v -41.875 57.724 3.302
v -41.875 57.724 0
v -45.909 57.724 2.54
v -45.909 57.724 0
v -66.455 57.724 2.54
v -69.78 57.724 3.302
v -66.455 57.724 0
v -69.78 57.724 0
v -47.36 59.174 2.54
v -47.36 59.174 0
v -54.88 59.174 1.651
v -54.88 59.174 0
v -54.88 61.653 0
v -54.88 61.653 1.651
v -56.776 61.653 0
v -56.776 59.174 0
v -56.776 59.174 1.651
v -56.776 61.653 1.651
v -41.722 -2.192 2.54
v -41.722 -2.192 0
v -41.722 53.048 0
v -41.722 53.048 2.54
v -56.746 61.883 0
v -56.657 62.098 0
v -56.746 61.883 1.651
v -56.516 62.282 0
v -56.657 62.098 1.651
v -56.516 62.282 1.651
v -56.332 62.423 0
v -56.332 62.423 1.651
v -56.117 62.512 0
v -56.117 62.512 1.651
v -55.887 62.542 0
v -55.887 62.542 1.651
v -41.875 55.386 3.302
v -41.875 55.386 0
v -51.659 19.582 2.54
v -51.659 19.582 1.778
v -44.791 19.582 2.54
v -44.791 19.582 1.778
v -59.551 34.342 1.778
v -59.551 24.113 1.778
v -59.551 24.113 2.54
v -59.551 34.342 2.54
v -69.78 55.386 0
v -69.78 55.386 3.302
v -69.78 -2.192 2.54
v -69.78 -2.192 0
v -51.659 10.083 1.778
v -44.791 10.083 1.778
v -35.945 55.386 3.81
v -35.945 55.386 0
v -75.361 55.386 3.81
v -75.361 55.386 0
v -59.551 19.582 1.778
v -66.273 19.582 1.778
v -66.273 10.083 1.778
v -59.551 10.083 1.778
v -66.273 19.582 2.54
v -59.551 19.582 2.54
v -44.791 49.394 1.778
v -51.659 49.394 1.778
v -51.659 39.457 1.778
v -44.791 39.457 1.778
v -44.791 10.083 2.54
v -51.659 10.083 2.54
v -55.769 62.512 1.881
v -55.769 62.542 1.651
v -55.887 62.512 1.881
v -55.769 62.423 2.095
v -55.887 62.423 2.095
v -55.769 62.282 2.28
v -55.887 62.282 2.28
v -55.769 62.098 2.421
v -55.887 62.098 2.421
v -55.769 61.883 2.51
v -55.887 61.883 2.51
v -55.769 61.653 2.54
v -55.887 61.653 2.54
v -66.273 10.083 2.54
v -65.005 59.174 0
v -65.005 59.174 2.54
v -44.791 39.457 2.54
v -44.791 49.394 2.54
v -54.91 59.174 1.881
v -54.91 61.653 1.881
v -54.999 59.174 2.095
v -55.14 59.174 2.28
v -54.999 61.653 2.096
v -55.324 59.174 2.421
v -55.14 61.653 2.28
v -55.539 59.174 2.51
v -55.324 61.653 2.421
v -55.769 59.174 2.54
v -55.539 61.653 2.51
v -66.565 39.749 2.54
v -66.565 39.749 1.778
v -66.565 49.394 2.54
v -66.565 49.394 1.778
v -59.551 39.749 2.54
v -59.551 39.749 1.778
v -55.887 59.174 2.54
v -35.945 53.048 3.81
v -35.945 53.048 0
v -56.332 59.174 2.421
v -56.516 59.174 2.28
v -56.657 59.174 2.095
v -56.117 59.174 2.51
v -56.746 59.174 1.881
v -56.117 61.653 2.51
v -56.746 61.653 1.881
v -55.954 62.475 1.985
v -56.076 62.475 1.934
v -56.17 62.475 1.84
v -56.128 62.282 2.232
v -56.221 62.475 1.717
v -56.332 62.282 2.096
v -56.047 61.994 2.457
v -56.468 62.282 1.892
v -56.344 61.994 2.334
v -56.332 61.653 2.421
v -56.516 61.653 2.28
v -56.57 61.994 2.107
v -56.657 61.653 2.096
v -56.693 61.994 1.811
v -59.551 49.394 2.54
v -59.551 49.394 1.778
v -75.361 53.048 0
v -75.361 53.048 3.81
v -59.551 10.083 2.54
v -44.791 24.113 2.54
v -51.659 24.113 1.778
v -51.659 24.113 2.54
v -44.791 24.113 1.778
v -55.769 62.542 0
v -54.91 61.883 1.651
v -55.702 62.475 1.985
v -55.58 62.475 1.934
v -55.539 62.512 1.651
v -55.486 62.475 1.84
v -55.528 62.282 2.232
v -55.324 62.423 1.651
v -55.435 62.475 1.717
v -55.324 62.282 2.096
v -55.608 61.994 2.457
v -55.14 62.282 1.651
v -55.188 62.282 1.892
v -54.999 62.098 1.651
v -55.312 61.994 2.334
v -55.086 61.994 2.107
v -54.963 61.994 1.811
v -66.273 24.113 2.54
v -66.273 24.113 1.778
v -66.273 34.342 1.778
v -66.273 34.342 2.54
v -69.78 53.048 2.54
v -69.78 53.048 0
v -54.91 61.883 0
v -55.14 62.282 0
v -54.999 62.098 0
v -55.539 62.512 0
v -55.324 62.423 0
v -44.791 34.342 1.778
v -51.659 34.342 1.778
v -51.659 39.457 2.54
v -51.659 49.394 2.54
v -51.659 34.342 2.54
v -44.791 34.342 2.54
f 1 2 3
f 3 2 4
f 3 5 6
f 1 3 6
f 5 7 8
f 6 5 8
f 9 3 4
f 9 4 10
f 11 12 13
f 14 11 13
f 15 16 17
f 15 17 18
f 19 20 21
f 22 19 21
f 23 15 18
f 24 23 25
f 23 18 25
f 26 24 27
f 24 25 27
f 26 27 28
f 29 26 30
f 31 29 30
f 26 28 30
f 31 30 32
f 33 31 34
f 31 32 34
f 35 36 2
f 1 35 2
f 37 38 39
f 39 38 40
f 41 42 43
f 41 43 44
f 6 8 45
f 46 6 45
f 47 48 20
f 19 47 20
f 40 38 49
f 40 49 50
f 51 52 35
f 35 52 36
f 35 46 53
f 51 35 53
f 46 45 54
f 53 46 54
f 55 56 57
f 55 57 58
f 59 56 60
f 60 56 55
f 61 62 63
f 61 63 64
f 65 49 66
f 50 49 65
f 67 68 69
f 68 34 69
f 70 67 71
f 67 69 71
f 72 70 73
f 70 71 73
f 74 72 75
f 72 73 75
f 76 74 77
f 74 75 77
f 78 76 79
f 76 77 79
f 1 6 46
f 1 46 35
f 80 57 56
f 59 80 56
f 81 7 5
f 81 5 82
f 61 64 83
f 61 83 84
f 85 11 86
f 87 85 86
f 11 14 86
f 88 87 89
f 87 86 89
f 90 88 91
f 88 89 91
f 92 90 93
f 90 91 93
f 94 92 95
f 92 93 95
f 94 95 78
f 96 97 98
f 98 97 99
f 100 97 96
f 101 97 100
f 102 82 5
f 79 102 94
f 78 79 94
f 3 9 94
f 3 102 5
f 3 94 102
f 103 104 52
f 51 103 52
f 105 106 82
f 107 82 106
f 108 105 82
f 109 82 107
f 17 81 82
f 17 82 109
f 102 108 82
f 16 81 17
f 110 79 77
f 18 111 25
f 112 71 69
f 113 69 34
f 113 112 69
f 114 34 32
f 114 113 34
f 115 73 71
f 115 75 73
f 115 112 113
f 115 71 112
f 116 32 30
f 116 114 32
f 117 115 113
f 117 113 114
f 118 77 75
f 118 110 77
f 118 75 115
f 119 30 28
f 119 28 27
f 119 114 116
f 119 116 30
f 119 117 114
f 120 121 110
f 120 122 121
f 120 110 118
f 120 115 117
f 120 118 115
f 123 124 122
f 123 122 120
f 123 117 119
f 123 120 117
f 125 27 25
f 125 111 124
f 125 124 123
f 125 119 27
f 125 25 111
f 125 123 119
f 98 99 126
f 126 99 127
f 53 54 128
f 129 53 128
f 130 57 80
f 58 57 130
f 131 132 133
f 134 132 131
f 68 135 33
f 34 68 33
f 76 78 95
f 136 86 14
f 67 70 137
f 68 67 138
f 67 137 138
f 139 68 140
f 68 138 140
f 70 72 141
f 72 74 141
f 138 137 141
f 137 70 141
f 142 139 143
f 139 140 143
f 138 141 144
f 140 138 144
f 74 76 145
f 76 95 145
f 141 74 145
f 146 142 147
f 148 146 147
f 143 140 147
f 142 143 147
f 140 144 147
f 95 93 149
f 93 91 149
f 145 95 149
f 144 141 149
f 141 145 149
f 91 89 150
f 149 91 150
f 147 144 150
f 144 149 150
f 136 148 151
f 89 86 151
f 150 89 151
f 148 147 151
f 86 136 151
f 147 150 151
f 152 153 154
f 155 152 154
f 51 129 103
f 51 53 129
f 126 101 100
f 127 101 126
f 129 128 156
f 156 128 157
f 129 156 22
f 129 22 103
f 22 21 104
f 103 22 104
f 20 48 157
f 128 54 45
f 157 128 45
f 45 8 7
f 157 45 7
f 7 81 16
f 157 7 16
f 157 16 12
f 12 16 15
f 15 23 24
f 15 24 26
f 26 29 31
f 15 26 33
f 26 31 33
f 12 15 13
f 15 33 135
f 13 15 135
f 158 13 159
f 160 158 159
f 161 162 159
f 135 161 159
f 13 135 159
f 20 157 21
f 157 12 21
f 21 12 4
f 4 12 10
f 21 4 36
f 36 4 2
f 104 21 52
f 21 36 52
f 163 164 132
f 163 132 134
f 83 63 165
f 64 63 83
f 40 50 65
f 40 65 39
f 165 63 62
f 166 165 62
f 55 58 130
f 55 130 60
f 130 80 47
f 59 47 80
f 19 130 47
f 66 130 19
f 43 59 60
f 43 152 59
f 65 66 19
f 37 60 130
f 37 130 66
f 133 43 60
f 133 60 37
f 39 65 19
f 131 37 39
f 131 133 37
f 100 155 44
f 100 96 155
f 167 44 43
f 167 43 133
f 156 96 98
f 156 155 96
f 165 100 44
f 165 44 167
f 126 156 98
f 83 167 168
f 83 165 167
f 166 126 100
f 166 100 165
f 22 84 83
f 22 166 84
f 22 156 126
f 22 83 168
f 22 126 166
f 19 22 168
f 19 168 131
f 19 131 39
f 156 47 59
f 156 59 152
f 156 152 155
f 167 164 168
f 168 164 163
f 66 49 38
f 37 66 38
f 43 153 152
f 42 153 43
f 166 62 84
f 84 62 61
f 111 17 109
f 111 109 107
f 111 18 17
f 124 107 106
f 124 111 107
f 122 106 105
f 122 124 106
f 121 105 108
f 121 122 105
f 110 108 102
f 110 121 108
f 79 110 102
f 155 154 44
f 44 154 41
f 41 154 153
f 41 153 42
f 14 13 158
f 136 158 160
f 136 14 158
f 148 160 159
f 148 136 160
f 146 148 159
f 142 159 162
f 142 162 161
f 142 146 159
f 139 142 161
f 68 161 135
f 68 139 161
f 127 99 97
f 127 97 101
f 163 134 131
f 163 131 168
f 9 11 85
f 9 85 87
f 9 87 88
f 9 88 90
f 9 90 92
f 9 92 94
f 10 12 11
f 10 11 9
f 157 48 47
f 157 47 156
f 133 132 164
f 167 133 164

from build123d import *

# Parameters (mm, degrees)
F0_W        = 0.9483136237
F0_H        = 3.3681727946
F0_W_2      = 28.0582979321
F0_H_2      = 55.2397826687
F0_W_3      = 6.7223012447
F0_H_3      = 9.4989053905
F0_H_4      = 10.2295875549
F0_W_4      = 6.8684406579
F0_W_5      = 7.014580071
F0_H_5      = 9.6450410783
F0_H_6      = 9.9373161793
F0_W_6      = 10.7689313591
F0_H_7      = 1.450072974
F0_W_7      = 10.0600272417
F1_DEPTH    = 2.54
F2_R        = 0.889
F3_DEPTH    = 1.778
F4_T4_DEPTH = 15.6041495789
F4_T9_DEPTH = 15.6041495789
F5_DEPTH    = 3.81
F6_DEPTH    = 3.302


# Not quite as in the source:
# - a fillet or chamfer that OpenCascade refuses, or shapes differently, is made with other operations: its cross-section is extruded or revolved along the edge and cut away or added


with BuildPart() as f1:
    # F0 (on Top) → F1 (new body)
    with BuildSketch(Plane.XY):
        with Locations((-55.3537514061, 60.8582701534)):
            Rectangle(F0_W, F0_H)
        Polygon((-69.7804093361, 57.7241107821), (-69.7804093361, 55.3859174252), (-41.8754070997, 55.3859174252), (-41.8754070997, 57.7241107821), (-44.8195673525, 57.7241107821), (-54.8795945942, 57.7241107821), (-55.8279082179, 57.7241107821), (-56.7762218416, 57.7241107821), (-67.5451532006, 57.7241107821), align=None)
        Polygon((-75.3612667322, 53.0477277935), (-69.7804093361, 53.0477277935), (-41.7221114039, 53.0477277935), (-35.9445475042, 53.0477277935), (-35.9445475042, 55.3859174252), (-41.8754070997, 55.3859174252), (-69.7804093361, 55.3859174252), (-75.3612667322, 55.3859174252), align=None)
        with Locations((-56.3020650297, 60.8582701534)):
            Rectangle(F0_W, F0_H)
        with Locations((-55.75126037, 25.4278364591)):
            Rectangle(F0_W_2, F0_H_2)
        with Locations((-62.9119724035, 14.8329045624)):
            Rectangle(F0_W_3, F0_H_3, mode=Mode.SUBTRACT)
        with Locations((-62.9119724035, 29.2273983359)):
            Rectangle(F0_W_3, F0_H_4, mode=Mode.SUBTRACT)
        with Locations((-48.2252072543, 14.8329045624)):
            Rectangle(F0_W_4, F0_H_3, mode=Mode.SUBTRACT)
        with Locations((-48.2252072543, 29.2273983359)):
            Rectangle(F0_W_4, F0_H_4, mode=Mode.SUBTRACT)
        with Locations((-63.0581118166, 44.571781531)):
            Rectangle(F0_W_5, F0_H_5, mode=Mode.SUBTRACT)
        with Locations((-48.2252072543, 44.4256439805)):
            Rectangle(F0_W_4, F0_H_6, mode=Mode.SUBTRACT)
        with Locations((-62.1606875211, 58.4491472691)):
            Rectangle(F0_W_6, F0_H_7)
        with Locations((-55.3537514061, 58.4491472691)):
            Rectangle(F0_W, F0_H_7)
        with Locations((-49.8495809734, 58.4491472691)):
            Rectangle(F0_W_7, F0_H_7)
        with Locations((-56.3020650297, 58.4491472691)):
            Rectangle(F0_W, F0_H_7)
    extrude(amount=F1_DEPTH)

    # F2
    f2_edges = [f1.edges().sort_by_distance(p)[0] for p in [
        (-54.879595, 60.85827, 2.54),
        (-56.776222, 60.85827, 2.54),
        (-55.827908, 62.542357, 2.54),
        (-56.776222, 62.542357, 1.27),
        (-54.879595, 62.542357, 1.27),
    ]]
    fillet(f2_edges, radius=F2_R)

    # F0 (on Top) → F3 (join)
    with BuildSketch(Plane.XY):
        with Locations((-63.0581118166, 44.571781531)):
            Rectangle(F0_W_5, F0_H_5)
        with Locations((-48.2252072543, 44.4256439805)):
            Rectangle(F0_W_4, F0_H_6)
        with Locations((-62.9119724035, 29.2273983359)):
            Rectangle(F0_W_3, F0_H_4)
        with Locations((-48.2252072543, 29.2273983359)):
            Rectangle(F0_W_4, F0_H_4)
        with Locations((-48.2252072543, 14.8329045624)):
            Rectangle(F0_W_4, F0_H_3)
        with Locations((-62.9119724035, 14.8329045624)):
            Rectangle(F0_W_3, F0_H_3)
    extrude(amount=F3_DEPTH)

    # F4: chamfer of 2.54 on 2 edges, made by hand


with BuildPart() as f4_tool2:
    # F4_s3 → F4_t4 (new body)
    with BuildSketch(Plane.XY.offset(-6.5320747894)):
        Polygon((-67.5451532006, 56.6341837561), (-65.0051532006, 59.1741837561), (-67.5451532006, 59.1741837561), align=None)
    extrude(amount=F4_T4_DEPTH)

    split(bisect_by=Plane.XZ.offset(-57.7241107821), keep=Keep.BOTTOM)


with BuildPart() as f1_1:
    add(f1.part)

    # F4_t1: cut F4_tool2
    add(f4_tool2.part, mode=Mode.SUBTRACT)


with BuildPart() as f4_tool7:
    # F4_s8 → F4_t9 (new body)
    with BuildSketch(Plane.XY.offset(-6.5320747894)):
        Polygon((-44.8195673525, 56.6341837561), (-47.3595673525, 59.1741837561), (-44.8195673525, 59.1741837561), align=None)
    extrude(amount=F4_T9_DEPTH)

    split(bisect_by=Plane.XZ.offset(-57.7241107821), keep=Keep.BOTTOM)


with BuildPart() as f1_2:
    add(f1_1.part)

    # F4_t6: cut F4_tool7
    add(f4_tool7.part, mode=Mode.SUBTRACT)

    # F0 (on Top) → F5 (join)
    with BuildSketch(Plane.XY):
        Polygon((-75.3612667322, 53.0477277935), (-69.7804093361, 53.0477277935), (-41.7221114039, 53.0477277935), (-35.9445475042, 53.0477277935), (-35.9445475042, 55.3859174252), (-41.8754070997, 55.3859174252), (-69.7804093361, 55.3859174252), (-75.3612667322, 55.3859174252), align=None)
    extrude(amount=F5_DEPTH)

    # F0 (on Top) → F6 (join)
    with BuildSketch(Plane.XY):
        Polygon((-69.7804093361, 57.7241107821), (-69.7804093361, 55.3859174252), (-41.8754070997, 55.3859174252), (-41.8754070997, 57.7241107821), (-44.8195673525, 57.7241107821), (-54.8795945942, 57.7241107821), (-55.8279082179, 57.7241107821), (-56.7762218416, 57.7241107821), (-67.5451532006, 57.7241107821), align=None)
    extrude(amount=F6_DEPTH)


solid = f1_2.part
